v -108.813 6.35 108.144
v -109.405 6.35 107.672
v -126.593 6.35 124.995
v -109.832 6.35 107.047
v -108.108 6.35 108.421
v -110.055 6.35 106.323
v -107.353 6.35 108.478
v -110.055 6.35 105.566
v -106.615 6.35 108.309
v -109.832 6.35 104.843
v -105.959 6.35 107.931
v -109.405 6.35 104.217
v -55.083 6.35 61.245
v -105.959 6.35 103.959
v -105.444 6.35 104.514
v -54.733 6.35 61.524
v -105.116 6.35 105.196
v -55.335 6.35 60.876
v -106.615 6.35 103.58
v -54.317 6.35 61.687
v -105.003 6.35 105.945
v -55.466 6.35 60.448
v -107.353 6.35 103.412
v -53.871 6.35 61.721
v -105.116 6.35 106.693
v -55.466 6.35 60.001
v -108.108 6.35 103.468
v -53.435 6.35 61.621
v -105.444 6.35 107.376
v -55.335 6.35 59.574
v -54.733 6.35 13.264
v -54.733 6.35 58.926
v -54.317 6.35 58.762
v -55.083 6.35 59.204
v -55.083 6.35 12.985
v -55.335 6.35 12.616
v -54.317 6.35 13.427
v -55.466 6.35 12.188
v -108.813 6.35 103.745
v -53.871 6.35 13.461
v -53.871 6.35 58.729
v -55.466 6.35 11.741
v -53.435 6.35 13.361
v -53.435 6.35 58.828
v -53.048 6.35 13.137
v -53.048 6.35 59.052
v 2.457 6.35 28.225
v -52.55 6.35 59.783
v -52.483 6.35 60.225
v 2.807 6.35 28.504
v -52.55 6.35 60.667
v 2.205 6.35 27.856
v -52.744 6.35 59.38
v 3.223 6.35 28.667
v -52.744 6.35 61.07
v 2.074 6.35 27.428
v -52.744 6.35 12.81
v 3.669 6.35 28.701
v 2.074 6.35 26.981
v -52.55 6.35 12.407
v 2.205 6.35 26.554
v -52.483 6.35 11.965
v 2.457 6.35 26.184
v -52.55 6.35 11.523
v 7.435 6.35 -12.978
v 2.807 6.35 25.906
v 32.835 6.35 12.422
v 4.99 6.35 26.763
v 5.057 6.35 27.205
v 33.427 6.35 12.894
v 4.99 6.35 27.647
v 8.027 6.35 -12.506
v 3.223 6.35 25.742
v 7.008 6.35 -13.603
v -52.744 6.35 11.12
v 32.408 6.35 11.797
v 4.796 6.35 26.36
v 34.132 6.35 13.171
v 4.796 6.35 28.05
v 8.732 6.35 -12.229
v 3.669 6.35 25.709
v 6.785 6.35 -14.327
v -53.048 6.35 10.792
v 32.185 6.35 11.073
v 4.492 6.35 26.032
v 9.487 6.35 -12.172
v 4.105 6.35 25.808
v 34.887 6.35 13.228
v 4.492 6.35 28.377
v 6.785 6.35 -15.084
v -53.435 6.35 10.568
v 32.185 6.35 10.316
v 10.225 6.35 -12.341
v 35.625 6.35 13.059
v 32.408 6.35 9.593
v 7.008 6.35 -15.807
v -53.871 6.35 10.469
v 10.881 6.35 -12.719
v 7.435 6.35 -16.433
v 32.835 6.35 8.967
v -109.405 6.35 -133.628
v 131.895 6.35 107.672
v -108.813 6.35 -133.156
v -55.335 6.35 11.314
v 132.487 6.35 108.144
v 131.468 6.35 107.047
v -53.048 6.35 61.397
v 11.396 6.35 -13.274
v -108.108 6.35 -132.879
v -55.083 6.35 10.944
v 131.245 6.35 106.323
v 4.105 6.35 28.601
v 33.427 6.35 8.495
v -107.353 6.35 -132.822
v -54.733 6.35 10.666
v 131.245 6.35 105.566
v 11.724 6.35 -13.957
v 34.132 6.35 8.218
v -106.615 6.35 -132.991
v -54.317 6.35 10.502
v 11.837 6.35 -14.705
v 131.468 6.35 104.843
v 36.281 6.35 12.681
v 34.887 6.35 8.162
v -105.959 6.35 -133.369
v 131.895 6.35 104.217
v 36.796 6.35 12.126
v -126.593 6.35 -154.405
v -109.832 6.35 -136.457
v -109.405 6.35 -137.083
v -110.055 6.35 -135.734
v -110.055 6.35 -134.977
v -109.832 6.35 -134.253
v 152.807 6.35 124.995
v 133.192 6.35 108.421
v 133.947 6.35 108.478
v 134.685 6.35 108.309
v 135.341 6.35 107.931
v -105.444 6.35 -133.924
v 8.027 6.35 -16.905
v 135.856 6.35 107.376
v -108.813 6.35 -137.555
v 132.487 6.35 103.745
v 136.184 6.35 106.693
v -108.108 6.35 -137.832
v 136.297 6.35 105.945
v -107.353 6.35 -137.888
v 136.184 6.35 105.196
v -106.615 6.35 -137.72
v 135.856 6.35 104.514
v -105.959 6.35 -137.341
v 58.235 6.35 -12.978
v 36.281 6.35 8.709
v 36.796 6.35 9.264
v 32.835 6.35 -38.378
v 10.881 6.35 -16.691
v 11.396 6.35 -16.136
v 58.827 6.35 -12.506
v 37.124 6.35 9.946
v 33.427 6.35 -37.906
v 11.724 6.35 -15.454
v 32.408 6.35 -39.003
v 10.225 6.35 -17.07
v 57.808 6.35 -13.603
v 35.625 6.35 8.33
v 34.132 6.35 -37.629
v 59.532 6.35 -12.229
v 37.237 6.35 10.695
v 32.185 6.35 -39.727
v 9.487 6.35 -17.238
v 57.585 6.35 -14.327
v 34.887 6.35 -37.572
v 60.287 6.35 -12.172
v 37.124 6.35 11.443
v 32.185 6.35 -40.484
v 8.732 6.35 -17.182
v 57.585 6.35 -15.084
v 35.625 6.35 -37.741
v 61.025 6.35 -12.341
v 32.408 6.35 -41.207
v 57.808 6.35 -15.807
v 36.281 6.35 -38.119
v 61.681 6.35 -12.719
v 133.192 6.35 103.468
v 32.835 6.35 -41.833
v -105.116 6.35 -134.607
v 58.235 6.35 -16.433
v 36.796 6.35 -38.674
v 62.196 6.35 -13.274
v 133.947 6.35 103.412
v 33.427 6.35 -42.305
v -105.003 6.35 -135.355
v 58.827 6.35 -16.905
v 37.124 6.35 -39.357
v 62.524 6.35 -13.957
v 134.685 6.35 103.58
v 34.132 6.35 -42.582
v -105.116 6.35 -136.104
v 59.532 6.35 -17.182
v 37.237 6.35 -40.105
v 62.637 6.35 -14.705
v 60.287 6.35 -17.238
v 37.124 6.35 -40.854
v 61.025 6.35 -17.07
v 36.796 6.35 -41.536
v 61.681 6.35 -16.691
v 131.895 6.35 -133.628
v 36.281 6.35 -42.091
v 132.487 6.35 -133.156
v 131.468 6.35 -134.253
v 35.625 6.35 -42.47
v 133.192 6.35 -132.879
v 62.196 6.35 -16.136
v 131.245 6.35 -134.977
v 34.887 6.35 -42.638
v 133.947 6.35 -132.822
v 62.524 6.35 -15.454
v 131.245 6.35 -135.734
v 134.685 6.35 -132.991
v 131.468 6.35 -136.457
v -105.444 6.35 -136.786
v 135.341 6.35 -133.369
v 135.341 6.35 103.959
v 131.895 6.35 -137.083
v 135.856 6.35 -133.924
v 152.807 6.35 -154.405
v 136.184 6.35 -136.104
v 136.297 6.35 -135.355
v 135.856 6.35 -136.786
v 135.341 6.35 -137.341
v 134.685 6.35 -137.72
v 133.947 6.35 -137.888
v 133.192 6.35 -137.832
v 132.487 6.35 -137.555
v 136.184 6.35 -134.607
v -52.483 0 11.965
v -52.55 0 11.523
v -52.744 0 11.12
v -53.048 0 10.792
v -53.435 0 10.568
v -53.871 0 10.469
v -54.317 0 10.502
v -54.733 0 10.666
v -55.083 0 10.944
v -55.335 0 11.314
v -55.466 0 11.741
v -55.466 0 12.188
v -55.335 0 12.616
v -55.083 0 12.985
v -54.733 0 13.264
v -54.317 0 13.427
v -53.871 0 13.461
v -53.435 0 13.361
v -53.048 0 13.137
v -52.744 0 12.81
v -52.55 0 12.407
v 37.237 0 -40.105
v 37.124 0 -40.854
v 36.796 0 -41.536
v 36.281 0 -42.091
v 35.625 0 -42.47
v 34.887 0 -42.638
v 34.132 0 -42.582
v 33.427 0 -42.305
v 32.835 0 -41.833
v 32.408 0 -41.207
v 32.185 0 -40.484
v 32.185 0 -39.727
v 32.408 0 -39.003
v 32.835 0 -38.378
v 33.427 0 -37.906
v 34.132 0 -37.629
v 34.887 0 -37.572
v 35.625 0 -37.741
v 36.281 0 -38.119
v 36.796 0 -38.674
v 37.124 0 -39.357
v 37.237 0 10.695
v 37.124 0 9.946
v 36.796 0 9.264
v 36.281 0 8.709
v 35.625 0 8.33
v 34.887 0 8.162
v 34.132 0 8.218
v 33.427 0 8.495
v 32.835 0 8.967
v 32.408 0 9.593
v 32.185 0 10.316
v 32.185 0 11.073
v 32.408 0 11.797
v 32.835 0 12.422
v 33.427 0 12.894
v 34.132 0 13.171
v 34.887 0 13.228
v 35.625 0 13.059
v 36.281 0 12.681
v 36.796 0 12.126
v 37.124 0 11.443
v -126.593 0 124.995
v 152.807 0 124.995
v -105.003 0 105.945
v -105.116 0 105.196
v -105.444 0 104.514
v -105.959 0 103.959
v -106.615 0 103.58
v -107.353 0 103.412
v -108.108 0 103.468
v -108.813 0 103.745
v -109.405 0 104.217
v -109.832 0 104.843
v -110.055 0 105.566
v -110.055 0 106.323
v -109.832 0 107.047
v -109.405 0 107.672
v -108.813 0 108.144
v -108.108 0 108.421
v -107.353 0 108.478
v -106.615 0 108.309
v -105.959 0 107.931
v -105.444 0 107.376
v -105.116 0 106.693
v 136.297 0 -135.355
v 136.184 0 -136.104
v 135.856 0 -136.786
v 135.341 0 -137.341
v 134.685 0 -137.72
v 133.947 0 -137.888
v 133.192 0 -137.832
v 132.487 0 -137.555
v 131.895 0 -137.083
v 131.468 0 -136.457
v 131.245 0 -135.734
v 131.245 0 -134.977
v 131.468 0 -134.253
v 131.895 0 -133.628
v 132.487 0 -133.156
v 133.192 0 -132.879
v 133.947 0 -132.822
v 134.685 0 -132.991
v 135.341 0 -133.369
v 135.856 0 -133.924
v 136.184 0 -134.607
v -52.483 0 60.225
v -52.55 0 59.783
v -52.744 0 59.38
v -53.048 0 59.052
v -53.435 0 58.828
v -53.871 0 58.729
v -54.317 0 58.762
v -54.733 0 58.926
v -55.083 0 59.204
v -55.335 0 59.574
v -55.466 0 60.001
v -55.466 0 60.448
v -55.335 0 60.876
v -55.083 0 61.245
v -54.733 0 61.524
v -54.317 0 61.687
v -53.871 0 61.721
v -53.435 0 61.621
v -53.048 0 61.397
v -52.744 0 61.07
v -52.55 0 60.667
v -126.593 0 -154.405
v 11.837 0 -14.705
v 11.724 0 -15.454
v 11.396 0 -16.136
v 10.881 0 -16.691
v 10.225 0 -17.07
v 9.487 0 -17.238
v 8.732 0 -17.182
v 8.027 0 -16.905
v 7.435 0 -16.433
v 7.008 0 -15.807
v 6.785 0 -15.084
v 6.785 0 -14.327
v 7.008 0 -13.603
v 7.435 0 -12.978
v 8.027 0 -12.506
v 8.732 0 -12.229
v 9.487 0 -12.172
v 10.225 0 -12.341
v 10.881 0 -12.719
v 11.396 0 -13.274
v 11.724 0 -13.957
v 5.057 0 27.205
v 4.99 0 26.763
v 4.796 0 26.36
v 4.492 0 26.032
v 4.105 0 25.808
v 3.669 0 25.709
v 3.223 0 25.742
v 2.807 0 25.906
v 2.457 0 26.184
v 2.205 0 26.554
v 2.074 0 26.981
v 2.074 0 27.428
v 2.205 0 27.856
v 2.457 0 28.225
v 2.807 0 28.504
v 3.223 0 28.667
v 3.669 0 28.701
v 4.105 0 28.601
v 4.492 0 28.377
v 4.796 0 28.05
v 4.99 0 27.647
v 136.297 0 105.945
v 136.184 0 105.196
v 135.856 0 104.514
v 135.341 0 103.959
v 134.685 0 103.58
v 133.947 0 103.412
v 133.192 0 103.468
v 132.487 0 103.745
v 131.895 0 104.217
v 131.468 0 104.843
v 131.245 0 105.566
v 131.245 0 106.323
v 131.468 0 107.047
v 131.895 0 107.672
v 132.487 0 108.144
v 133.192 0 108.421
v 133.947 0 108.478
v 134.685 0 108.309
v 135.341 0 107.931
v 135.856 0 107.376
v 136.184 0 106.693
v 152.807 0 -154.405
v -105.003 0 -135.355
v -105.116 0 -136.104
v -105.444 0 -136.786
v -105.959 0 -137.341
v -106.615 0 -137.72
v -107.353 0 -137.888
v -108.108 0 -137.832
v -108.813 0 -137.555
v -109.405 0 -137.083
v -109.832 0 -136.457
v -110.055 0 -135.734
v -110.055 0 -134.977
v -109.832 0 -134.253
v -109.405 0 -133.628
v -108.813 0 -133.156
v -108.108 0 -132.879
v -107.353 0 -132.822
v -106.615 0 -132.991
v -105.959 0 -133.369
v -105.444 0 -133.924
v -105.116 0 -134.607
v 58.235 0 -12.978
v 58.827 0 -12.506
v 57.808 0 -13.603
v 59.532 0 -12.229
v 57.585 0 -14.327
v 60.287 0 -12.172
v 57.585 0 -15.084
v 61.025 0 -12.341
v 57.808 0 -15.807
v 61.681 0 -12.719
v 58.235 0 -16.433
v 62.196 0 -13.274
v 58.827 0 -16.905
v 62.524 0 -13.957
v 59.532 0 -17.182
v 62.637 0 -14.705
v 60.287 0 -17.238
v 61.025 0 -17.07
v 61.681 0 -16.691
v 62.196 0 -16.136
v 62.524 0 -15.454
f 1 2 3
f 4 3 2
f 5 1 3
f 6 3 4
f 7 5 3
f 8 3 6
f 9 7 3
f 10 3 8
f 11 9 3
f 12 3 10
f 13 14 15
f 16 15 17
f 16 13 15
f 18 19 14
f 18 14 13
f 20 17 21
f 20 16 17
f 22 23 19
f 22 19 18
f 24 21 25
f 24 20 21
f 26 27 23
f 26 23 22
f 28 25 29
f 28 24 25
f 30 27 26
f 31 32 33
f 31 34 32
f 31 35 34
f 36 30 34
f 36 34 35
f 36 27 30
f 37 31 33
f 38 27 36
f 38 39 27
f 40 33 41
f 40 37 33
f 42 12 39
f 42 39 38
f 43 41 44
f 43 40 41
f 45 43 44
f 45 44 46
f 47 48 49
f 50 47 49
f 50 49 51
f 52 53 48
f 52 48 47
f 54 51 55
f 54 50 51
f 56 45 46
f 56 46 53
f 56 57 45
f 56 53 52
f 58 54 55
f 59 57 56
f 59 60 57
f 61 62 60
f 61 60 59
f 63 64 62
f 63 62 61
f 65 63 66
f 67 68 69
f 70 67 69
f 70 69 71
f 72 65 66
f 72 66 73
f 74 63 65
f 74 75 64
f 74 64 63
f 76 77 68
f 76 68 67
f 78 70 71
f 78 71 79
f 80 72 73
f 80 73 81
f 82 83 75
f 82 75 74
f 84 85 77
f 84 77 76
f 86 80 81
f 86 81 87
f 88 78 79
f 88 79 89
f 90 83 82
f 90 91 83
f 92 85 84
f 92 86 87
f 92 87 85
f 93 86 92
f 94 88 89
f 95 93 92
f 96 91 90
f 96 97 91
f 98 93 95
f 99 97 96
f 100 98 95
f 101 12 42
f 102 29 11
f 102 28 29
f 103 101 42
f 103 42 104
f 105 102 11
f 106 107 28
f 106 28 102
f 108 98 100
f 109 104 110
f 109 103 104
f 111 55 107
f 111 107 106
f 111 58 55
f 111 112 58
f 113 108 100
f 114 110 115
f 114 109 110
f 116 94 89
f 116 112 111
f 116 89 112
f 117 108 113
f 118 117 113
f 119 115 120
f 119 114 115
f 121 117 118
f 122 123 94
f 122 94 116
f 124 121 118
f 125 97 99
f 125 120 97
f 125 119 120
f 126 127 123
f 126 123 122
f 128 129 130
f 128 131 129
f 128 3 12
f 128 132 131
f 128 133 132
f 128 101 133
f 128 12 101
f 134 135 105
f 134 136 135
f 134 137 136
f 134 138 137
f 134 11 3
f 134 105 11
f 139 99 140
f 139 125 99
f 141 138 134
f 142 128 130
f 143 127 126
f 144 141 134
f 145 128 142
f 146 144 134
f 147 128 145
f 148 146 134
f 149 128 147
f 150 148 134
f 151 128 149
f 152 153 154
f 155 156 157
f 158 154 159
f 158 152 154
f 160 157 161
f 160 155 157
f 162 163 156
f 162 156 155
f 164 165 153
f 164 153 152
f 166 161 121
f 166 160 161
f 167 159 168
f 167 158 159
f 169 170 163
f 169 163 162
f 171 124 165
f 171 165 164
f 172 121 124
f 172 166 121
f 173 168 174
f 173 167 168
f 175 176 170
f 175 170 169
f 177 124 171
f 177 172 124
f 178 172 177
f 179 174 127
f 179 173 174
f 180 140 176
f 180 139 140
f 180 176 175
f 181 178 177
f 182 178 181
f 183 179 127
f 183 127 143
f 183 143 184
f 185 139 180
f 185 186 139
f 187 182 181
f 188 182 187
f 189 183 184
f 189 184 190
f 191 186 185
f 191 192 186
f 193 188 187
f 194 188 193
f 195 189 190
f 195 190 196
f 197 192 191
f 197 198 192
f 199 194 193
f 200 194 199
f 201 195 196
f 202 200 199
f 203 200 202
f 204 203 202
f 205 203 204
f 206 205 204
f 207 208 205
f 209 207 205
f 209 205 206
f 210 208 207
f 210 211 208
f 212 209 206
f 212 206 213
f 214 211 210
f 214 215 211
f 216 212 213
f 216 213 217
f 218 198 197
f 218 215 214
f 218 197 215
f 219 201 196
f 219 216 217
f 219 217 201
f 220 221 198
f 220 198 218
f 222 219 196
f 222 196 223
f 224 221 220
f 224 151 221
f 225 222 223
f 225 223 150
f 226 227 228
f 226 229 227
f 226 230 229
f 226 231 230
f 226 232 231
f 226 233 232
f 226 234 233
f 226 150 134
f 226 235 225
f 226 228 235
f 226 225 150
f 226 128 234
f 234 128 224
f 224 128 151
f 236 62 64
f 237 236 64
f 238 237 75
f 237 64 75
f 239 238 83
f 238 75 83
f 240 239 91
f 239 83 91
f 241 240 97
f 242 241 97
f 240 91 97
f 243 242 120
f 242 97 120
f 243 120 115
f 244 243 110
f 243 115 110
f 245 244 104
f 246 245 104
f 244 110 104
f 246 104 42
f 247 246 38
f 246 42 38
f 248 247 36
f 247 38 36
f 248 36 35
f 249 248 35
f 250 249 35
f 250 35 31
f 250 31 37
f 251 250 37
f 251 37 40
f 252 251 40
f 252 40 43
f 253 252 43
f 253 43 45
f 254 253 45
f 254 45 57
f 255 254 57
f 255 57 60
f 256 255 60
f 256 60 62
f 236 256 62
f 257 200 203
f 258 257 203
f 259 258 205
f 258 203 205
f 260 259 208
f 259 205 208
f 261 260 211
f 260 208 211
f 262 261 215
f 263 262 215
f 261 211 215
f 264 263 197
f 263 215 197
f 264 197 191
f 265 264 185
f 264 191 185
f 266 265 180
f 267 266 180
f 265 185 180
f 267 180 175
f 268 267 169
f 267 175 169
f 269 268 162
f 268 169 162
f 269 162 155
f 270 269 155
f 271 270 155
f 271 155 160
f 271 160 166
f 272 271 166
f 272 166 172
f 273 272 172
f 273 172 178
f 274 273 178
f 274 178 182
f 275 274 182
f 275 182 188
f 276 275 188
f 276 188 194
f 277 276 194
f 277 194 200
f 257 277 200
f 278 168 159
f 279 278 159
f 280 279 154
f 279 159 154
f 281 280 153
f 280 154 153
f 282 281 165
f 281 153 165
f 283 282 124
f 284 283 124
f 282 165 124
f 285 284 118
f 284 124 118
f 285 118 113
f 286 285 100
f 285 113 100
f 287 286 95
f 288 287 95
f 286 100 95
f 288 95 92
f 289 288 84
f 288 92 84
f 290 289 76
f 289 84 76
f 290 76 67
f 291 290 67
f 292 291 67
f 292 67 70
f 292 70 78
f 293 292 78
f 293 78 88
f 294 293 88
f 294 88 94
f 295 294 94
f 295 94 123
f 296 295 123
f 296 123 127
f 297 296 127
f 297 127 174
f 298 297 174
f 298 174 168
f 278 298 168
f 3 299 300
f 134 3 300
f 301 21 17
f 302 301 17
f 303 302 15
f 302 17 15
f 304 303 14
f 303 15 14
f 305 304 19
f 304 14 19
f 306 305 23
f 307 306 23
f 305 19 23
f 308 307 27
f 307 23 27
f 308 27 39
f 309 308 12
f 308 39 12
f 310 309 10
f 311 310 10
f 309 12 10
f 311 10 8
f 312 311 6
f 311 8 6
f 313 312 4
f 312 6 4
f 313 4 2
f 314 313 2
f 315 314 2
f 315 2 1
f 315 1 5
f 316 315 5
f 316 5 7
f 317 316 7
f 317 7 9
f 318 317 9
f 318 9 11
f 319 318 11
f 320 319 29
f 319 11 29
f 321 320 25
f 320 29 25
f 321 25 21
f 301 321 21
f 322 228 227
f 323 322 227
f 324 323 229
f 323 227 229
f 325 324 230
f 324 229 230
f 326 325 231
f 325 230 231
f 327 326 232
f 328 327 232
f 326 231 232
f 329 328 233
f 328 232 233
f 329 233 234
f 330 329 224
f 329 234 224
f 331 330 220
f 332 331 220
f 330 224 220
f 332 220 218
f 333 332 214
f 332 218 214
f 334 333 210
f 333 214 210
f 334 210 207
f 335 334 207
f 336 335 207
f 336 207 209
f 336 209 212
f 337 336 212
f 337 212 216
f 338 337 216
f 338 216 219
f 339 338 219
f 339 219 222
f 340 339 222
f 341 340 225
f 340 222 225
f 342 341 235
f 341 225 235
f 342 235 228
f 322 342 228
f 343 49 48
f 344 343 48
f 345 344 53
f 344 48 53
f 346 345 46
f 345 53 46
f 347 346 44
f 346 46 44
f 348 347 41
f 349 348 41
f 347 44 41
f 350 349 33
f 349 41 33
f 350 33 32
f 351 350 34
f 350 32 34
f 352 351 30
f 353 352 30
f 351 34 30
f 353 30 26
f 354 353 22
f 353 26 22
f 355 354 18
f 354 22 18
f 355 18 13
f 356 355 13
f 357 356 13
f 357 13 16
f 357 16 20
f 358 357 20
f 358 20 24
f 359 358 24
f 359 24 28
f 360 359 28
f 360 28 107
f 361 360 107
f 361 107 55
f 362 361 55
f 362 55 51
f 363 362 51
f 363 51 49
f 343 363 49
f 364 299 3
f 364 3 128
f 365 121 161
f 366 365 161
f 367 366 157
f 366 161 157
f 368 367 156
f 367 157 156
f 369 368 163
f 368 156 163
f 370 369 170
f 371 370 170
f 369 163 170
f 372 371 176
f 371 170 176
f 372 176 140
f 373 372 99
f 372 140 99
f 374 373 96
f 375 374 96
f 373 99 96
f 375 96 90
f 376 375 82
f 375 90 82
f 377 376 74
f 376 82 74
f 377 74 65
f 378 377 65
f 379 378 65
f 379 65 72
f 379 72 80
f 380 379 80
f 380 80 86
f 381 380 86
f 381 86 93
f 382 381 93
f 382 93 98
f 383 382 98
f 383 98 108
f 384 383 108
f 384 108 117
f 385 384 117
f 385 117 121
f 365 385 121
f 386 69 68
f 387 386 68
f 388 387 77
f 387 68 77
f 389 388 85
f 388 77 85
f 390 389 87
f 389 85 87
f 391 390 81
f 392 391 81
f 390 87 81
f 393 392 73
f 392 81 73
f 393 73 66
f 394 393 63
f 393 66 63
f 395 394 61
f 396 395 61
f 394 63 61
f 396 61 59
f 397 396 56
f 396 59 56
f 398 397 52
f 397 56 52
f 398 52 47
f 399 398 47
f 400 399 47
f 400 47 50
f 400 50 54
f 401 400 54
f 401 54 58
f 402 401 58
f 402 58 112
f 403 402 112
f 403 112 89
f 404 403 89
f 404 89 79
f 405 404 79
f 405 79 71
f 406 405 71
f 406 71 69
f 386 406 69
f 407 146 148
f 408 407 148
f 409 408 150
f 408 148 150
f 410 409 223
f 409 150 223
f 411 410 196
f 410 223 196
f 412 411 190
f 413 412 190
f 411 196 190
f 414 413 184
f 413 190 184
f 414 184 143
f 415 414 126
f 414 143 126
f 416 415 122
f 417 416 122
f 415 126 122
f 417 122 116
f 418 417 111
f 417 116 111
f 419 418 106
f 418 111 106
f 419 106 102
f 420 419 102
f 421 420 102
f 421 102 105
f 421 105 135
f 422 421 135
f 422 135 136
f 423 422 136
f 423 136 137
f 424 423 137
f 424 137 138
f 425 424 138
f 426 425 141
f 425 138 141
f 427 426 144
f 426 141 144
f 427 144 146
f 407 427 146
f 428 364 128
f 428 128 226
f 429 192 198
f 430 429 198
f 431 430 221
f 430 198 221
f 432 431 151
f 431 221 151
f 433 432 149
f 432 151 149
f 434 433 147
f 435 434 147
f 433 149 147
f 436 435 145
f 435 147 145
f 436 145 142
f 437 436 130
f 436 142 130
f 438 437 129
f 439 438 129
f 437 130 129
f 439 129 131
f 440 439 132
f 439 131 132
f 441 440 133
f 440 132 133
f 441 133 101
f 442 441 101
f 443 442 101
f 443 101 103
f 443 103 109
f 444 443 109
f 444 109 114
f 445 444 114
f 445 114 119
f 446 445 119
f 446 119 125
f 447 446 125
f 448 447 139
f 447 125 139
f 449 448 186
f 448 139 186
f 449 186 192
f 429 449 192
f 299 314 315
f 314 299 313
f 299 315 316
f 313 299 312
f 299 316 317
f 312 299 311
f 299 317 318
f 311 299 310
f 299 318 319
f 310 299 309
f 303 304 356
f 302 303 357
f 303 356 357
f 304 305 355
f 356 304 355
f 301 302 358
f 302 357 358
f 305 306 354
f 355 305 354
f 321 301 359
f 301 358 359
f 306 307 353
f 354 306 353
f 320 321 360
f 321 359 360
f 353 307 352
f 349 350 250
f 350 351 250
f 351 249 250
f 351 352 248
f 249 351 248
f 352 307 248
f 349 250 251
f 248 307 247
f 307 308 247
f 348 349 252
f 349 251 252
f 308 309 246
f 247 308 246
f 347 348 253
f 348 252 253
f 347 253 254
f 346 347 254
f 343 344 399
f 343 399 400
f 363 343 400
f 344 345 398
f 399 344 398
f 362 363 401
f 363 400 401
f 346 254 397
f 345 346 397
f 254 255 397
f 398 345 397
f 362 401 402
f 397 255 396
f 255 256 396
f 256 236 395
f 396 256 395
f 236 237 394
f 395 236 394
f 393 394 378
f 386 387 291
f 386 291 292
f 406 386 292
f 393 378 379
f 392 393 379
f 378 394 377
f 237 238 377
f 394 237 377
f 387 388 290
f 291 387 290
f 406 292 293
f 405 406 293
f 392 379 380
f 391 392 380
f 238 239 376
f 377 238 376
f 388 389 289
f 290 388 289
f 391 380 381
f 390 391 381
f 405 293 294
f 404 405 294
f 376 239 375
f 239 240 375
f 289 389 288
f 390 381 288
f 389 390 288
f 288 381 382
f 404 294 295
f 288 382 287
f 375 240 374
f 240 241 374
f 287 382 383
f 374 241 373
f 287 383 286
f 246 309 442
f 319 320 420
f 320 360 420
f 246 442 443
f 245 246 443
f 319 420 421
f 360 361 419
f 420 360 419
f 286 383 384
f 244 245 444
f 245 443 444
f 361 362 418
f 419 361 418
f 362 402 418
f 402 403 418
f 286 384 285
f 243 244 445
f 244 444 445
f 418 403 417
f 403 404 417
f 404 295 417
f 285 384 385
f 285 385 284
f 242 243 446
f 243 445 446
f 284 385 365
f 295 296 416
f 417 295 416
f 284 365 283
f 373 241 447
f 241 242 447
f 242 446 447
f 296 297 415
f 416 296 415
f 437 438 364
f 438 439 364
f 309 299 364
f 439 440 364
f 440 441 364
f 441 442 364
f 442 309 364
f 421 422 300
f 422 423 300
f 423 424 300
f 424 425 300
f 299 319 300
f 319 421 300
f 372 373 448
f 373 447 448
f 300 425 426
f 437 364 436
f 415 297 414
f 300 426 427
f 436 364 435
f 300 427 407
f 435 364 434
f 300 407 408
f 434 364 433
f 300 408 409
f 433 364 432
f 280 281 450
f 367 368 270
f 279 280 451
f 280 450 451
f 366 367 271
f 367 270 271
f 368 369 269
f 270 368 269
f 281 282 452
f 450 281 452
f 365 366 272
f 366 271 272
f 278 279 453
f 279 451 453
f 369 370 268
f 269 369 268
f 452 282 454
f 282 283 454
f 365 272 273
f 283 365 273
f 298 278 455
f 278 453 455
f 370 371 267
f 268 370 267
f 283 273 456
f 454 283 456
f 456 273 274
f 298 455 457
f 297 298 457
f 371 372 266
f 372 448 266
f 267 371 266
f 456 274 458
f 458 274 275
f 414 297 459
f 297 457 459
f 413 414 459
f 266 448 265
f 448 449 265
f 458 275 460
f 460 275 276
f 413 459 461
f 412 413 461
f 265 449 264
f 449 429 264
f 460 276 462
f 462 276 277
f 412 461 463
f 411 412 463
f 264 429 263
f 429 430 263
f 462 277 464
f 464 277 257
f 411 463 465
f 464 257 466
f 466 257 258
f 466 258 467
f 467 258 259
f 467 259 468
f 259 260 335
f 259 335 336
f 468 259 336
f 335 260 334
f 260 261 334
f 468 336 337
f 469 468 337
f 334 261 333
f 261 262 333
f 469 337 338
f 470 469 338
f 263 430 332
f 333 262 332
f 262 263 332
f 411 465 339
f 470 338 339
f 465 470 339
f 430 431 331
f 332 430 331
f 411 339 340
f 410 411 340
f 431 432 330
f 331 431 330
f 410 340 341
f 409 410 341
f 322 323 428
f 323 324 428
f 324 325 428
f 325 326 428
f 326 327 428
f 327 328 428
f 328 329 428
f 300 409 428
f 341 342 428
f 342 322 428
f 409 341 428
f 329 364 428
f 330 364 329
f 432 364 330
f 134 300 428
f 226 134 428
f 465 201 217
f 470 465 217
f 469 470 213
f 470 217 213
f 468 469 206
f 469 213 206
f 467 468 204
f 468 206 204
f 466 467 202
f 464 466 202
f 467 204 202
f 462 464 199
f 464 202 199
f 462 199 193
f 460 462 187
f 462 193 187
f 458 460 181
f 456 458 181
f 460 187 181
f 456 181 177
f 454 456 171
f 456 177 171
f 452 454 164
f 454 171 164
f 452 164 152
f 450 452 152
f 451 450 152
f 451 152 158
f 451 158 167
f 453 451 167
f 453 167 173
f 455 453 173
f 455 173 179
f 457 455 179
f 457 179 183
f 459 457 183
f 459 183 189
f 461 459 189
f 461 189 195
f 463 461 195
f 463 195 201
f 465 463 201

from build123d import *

# Parameters (mm, degrees)
SKETCH1_W                = 279.4
SKETCH1_H                = 279.4
BASE_EXTRUSION_DEPTH     = 6.35
SKETCH2_R                = 2.54
CONSTRUCTION_HOLES_DEPTH = 6.35
SKETCH3_R                = 1.5
BOARD_HOLES_DEPTH        = 127
SKETCH4_R                = 2.54
MOTOR_HOLES_DEPTH        = 36.576


with BuildPart() as part:
    # Sketch1 → base_extrusion (new body)
    with BuildSketch(Plane(origin=(0, 0, 0), x_dir=(1, 0, 0), z_dir=(0, 1, 0))):
        with Locations((13.106864989, 14.705263158)):
            Rectangle(SKETCH1_W, SKETCH1_H)
    extrude(amount=BASE_EXTRUSION_DEPTH)

    # Sketch2 → construction_holes (cut)
    with BuildSketch(Plane(origin=(0, 6.35, 0), x_dir=(1, 0, 0), z_dir=(0, 1, 0))):
        with Locations((-107.543135011, 135.355263158)):
            Circle(SKETCH2_R)
        with Locations((133.756864989, 135.355263158)):
            Circle(SKETCH2_R)
        with Locations((133.756864989, -105.944736842)):
            Circle(SKETCH2_R)
        with Locations((-107.543135011, -105.944736842)):
            Circle(SKETCH2_R)
    extrude(amount=-CONSTRUCTION_HOLES_DEPTH, mode=Mode.SUBTRACT)

    # Sketch3 → board holes (cut)
    with BuildSketch(Plane(origin=(0, 6.35, 0), x_dir=(1, 0, 0), z_dir=(0, 1, 0))):
        with Locations((3.556864989, -27.204736715)):
            Circle(SKETCH3_R)
        with Locations((-53.983135011, -60.224736819)):
            Circle(SKETCH3_R)
        with Locations((-53.983135011, -11.964736865)):
            Circle(SKETCH3_R)
    extrude(amount=-BOARD_HOLES_DEPTH, mode=Mode.SUBTRACT)

    # Sketch4 → motor holes (cut)
    with BuildSketch(Plane(origin=(0, 6.35, 0), x_dir=(1, 0, 0), z_dir=(0, 1, 0))):
        with Locations((34.696864989, 40.105263158)):
            Circle(SKETCH4_R)
        with Locations((60.096864989, 14.705263158)):
            Circle(SKETCH4_R)
        with Locations((34.696864989, -10.694736842)):
            Circle(SKETCH4_R)
        with Locations((9.296864989, 14.705263158)):
            Circle(SKETCH4_R)
    extrude(amount=-MOTOR_HOLES_DEPTH, mode=Mode.SUBTRACT)


solid = part.part
